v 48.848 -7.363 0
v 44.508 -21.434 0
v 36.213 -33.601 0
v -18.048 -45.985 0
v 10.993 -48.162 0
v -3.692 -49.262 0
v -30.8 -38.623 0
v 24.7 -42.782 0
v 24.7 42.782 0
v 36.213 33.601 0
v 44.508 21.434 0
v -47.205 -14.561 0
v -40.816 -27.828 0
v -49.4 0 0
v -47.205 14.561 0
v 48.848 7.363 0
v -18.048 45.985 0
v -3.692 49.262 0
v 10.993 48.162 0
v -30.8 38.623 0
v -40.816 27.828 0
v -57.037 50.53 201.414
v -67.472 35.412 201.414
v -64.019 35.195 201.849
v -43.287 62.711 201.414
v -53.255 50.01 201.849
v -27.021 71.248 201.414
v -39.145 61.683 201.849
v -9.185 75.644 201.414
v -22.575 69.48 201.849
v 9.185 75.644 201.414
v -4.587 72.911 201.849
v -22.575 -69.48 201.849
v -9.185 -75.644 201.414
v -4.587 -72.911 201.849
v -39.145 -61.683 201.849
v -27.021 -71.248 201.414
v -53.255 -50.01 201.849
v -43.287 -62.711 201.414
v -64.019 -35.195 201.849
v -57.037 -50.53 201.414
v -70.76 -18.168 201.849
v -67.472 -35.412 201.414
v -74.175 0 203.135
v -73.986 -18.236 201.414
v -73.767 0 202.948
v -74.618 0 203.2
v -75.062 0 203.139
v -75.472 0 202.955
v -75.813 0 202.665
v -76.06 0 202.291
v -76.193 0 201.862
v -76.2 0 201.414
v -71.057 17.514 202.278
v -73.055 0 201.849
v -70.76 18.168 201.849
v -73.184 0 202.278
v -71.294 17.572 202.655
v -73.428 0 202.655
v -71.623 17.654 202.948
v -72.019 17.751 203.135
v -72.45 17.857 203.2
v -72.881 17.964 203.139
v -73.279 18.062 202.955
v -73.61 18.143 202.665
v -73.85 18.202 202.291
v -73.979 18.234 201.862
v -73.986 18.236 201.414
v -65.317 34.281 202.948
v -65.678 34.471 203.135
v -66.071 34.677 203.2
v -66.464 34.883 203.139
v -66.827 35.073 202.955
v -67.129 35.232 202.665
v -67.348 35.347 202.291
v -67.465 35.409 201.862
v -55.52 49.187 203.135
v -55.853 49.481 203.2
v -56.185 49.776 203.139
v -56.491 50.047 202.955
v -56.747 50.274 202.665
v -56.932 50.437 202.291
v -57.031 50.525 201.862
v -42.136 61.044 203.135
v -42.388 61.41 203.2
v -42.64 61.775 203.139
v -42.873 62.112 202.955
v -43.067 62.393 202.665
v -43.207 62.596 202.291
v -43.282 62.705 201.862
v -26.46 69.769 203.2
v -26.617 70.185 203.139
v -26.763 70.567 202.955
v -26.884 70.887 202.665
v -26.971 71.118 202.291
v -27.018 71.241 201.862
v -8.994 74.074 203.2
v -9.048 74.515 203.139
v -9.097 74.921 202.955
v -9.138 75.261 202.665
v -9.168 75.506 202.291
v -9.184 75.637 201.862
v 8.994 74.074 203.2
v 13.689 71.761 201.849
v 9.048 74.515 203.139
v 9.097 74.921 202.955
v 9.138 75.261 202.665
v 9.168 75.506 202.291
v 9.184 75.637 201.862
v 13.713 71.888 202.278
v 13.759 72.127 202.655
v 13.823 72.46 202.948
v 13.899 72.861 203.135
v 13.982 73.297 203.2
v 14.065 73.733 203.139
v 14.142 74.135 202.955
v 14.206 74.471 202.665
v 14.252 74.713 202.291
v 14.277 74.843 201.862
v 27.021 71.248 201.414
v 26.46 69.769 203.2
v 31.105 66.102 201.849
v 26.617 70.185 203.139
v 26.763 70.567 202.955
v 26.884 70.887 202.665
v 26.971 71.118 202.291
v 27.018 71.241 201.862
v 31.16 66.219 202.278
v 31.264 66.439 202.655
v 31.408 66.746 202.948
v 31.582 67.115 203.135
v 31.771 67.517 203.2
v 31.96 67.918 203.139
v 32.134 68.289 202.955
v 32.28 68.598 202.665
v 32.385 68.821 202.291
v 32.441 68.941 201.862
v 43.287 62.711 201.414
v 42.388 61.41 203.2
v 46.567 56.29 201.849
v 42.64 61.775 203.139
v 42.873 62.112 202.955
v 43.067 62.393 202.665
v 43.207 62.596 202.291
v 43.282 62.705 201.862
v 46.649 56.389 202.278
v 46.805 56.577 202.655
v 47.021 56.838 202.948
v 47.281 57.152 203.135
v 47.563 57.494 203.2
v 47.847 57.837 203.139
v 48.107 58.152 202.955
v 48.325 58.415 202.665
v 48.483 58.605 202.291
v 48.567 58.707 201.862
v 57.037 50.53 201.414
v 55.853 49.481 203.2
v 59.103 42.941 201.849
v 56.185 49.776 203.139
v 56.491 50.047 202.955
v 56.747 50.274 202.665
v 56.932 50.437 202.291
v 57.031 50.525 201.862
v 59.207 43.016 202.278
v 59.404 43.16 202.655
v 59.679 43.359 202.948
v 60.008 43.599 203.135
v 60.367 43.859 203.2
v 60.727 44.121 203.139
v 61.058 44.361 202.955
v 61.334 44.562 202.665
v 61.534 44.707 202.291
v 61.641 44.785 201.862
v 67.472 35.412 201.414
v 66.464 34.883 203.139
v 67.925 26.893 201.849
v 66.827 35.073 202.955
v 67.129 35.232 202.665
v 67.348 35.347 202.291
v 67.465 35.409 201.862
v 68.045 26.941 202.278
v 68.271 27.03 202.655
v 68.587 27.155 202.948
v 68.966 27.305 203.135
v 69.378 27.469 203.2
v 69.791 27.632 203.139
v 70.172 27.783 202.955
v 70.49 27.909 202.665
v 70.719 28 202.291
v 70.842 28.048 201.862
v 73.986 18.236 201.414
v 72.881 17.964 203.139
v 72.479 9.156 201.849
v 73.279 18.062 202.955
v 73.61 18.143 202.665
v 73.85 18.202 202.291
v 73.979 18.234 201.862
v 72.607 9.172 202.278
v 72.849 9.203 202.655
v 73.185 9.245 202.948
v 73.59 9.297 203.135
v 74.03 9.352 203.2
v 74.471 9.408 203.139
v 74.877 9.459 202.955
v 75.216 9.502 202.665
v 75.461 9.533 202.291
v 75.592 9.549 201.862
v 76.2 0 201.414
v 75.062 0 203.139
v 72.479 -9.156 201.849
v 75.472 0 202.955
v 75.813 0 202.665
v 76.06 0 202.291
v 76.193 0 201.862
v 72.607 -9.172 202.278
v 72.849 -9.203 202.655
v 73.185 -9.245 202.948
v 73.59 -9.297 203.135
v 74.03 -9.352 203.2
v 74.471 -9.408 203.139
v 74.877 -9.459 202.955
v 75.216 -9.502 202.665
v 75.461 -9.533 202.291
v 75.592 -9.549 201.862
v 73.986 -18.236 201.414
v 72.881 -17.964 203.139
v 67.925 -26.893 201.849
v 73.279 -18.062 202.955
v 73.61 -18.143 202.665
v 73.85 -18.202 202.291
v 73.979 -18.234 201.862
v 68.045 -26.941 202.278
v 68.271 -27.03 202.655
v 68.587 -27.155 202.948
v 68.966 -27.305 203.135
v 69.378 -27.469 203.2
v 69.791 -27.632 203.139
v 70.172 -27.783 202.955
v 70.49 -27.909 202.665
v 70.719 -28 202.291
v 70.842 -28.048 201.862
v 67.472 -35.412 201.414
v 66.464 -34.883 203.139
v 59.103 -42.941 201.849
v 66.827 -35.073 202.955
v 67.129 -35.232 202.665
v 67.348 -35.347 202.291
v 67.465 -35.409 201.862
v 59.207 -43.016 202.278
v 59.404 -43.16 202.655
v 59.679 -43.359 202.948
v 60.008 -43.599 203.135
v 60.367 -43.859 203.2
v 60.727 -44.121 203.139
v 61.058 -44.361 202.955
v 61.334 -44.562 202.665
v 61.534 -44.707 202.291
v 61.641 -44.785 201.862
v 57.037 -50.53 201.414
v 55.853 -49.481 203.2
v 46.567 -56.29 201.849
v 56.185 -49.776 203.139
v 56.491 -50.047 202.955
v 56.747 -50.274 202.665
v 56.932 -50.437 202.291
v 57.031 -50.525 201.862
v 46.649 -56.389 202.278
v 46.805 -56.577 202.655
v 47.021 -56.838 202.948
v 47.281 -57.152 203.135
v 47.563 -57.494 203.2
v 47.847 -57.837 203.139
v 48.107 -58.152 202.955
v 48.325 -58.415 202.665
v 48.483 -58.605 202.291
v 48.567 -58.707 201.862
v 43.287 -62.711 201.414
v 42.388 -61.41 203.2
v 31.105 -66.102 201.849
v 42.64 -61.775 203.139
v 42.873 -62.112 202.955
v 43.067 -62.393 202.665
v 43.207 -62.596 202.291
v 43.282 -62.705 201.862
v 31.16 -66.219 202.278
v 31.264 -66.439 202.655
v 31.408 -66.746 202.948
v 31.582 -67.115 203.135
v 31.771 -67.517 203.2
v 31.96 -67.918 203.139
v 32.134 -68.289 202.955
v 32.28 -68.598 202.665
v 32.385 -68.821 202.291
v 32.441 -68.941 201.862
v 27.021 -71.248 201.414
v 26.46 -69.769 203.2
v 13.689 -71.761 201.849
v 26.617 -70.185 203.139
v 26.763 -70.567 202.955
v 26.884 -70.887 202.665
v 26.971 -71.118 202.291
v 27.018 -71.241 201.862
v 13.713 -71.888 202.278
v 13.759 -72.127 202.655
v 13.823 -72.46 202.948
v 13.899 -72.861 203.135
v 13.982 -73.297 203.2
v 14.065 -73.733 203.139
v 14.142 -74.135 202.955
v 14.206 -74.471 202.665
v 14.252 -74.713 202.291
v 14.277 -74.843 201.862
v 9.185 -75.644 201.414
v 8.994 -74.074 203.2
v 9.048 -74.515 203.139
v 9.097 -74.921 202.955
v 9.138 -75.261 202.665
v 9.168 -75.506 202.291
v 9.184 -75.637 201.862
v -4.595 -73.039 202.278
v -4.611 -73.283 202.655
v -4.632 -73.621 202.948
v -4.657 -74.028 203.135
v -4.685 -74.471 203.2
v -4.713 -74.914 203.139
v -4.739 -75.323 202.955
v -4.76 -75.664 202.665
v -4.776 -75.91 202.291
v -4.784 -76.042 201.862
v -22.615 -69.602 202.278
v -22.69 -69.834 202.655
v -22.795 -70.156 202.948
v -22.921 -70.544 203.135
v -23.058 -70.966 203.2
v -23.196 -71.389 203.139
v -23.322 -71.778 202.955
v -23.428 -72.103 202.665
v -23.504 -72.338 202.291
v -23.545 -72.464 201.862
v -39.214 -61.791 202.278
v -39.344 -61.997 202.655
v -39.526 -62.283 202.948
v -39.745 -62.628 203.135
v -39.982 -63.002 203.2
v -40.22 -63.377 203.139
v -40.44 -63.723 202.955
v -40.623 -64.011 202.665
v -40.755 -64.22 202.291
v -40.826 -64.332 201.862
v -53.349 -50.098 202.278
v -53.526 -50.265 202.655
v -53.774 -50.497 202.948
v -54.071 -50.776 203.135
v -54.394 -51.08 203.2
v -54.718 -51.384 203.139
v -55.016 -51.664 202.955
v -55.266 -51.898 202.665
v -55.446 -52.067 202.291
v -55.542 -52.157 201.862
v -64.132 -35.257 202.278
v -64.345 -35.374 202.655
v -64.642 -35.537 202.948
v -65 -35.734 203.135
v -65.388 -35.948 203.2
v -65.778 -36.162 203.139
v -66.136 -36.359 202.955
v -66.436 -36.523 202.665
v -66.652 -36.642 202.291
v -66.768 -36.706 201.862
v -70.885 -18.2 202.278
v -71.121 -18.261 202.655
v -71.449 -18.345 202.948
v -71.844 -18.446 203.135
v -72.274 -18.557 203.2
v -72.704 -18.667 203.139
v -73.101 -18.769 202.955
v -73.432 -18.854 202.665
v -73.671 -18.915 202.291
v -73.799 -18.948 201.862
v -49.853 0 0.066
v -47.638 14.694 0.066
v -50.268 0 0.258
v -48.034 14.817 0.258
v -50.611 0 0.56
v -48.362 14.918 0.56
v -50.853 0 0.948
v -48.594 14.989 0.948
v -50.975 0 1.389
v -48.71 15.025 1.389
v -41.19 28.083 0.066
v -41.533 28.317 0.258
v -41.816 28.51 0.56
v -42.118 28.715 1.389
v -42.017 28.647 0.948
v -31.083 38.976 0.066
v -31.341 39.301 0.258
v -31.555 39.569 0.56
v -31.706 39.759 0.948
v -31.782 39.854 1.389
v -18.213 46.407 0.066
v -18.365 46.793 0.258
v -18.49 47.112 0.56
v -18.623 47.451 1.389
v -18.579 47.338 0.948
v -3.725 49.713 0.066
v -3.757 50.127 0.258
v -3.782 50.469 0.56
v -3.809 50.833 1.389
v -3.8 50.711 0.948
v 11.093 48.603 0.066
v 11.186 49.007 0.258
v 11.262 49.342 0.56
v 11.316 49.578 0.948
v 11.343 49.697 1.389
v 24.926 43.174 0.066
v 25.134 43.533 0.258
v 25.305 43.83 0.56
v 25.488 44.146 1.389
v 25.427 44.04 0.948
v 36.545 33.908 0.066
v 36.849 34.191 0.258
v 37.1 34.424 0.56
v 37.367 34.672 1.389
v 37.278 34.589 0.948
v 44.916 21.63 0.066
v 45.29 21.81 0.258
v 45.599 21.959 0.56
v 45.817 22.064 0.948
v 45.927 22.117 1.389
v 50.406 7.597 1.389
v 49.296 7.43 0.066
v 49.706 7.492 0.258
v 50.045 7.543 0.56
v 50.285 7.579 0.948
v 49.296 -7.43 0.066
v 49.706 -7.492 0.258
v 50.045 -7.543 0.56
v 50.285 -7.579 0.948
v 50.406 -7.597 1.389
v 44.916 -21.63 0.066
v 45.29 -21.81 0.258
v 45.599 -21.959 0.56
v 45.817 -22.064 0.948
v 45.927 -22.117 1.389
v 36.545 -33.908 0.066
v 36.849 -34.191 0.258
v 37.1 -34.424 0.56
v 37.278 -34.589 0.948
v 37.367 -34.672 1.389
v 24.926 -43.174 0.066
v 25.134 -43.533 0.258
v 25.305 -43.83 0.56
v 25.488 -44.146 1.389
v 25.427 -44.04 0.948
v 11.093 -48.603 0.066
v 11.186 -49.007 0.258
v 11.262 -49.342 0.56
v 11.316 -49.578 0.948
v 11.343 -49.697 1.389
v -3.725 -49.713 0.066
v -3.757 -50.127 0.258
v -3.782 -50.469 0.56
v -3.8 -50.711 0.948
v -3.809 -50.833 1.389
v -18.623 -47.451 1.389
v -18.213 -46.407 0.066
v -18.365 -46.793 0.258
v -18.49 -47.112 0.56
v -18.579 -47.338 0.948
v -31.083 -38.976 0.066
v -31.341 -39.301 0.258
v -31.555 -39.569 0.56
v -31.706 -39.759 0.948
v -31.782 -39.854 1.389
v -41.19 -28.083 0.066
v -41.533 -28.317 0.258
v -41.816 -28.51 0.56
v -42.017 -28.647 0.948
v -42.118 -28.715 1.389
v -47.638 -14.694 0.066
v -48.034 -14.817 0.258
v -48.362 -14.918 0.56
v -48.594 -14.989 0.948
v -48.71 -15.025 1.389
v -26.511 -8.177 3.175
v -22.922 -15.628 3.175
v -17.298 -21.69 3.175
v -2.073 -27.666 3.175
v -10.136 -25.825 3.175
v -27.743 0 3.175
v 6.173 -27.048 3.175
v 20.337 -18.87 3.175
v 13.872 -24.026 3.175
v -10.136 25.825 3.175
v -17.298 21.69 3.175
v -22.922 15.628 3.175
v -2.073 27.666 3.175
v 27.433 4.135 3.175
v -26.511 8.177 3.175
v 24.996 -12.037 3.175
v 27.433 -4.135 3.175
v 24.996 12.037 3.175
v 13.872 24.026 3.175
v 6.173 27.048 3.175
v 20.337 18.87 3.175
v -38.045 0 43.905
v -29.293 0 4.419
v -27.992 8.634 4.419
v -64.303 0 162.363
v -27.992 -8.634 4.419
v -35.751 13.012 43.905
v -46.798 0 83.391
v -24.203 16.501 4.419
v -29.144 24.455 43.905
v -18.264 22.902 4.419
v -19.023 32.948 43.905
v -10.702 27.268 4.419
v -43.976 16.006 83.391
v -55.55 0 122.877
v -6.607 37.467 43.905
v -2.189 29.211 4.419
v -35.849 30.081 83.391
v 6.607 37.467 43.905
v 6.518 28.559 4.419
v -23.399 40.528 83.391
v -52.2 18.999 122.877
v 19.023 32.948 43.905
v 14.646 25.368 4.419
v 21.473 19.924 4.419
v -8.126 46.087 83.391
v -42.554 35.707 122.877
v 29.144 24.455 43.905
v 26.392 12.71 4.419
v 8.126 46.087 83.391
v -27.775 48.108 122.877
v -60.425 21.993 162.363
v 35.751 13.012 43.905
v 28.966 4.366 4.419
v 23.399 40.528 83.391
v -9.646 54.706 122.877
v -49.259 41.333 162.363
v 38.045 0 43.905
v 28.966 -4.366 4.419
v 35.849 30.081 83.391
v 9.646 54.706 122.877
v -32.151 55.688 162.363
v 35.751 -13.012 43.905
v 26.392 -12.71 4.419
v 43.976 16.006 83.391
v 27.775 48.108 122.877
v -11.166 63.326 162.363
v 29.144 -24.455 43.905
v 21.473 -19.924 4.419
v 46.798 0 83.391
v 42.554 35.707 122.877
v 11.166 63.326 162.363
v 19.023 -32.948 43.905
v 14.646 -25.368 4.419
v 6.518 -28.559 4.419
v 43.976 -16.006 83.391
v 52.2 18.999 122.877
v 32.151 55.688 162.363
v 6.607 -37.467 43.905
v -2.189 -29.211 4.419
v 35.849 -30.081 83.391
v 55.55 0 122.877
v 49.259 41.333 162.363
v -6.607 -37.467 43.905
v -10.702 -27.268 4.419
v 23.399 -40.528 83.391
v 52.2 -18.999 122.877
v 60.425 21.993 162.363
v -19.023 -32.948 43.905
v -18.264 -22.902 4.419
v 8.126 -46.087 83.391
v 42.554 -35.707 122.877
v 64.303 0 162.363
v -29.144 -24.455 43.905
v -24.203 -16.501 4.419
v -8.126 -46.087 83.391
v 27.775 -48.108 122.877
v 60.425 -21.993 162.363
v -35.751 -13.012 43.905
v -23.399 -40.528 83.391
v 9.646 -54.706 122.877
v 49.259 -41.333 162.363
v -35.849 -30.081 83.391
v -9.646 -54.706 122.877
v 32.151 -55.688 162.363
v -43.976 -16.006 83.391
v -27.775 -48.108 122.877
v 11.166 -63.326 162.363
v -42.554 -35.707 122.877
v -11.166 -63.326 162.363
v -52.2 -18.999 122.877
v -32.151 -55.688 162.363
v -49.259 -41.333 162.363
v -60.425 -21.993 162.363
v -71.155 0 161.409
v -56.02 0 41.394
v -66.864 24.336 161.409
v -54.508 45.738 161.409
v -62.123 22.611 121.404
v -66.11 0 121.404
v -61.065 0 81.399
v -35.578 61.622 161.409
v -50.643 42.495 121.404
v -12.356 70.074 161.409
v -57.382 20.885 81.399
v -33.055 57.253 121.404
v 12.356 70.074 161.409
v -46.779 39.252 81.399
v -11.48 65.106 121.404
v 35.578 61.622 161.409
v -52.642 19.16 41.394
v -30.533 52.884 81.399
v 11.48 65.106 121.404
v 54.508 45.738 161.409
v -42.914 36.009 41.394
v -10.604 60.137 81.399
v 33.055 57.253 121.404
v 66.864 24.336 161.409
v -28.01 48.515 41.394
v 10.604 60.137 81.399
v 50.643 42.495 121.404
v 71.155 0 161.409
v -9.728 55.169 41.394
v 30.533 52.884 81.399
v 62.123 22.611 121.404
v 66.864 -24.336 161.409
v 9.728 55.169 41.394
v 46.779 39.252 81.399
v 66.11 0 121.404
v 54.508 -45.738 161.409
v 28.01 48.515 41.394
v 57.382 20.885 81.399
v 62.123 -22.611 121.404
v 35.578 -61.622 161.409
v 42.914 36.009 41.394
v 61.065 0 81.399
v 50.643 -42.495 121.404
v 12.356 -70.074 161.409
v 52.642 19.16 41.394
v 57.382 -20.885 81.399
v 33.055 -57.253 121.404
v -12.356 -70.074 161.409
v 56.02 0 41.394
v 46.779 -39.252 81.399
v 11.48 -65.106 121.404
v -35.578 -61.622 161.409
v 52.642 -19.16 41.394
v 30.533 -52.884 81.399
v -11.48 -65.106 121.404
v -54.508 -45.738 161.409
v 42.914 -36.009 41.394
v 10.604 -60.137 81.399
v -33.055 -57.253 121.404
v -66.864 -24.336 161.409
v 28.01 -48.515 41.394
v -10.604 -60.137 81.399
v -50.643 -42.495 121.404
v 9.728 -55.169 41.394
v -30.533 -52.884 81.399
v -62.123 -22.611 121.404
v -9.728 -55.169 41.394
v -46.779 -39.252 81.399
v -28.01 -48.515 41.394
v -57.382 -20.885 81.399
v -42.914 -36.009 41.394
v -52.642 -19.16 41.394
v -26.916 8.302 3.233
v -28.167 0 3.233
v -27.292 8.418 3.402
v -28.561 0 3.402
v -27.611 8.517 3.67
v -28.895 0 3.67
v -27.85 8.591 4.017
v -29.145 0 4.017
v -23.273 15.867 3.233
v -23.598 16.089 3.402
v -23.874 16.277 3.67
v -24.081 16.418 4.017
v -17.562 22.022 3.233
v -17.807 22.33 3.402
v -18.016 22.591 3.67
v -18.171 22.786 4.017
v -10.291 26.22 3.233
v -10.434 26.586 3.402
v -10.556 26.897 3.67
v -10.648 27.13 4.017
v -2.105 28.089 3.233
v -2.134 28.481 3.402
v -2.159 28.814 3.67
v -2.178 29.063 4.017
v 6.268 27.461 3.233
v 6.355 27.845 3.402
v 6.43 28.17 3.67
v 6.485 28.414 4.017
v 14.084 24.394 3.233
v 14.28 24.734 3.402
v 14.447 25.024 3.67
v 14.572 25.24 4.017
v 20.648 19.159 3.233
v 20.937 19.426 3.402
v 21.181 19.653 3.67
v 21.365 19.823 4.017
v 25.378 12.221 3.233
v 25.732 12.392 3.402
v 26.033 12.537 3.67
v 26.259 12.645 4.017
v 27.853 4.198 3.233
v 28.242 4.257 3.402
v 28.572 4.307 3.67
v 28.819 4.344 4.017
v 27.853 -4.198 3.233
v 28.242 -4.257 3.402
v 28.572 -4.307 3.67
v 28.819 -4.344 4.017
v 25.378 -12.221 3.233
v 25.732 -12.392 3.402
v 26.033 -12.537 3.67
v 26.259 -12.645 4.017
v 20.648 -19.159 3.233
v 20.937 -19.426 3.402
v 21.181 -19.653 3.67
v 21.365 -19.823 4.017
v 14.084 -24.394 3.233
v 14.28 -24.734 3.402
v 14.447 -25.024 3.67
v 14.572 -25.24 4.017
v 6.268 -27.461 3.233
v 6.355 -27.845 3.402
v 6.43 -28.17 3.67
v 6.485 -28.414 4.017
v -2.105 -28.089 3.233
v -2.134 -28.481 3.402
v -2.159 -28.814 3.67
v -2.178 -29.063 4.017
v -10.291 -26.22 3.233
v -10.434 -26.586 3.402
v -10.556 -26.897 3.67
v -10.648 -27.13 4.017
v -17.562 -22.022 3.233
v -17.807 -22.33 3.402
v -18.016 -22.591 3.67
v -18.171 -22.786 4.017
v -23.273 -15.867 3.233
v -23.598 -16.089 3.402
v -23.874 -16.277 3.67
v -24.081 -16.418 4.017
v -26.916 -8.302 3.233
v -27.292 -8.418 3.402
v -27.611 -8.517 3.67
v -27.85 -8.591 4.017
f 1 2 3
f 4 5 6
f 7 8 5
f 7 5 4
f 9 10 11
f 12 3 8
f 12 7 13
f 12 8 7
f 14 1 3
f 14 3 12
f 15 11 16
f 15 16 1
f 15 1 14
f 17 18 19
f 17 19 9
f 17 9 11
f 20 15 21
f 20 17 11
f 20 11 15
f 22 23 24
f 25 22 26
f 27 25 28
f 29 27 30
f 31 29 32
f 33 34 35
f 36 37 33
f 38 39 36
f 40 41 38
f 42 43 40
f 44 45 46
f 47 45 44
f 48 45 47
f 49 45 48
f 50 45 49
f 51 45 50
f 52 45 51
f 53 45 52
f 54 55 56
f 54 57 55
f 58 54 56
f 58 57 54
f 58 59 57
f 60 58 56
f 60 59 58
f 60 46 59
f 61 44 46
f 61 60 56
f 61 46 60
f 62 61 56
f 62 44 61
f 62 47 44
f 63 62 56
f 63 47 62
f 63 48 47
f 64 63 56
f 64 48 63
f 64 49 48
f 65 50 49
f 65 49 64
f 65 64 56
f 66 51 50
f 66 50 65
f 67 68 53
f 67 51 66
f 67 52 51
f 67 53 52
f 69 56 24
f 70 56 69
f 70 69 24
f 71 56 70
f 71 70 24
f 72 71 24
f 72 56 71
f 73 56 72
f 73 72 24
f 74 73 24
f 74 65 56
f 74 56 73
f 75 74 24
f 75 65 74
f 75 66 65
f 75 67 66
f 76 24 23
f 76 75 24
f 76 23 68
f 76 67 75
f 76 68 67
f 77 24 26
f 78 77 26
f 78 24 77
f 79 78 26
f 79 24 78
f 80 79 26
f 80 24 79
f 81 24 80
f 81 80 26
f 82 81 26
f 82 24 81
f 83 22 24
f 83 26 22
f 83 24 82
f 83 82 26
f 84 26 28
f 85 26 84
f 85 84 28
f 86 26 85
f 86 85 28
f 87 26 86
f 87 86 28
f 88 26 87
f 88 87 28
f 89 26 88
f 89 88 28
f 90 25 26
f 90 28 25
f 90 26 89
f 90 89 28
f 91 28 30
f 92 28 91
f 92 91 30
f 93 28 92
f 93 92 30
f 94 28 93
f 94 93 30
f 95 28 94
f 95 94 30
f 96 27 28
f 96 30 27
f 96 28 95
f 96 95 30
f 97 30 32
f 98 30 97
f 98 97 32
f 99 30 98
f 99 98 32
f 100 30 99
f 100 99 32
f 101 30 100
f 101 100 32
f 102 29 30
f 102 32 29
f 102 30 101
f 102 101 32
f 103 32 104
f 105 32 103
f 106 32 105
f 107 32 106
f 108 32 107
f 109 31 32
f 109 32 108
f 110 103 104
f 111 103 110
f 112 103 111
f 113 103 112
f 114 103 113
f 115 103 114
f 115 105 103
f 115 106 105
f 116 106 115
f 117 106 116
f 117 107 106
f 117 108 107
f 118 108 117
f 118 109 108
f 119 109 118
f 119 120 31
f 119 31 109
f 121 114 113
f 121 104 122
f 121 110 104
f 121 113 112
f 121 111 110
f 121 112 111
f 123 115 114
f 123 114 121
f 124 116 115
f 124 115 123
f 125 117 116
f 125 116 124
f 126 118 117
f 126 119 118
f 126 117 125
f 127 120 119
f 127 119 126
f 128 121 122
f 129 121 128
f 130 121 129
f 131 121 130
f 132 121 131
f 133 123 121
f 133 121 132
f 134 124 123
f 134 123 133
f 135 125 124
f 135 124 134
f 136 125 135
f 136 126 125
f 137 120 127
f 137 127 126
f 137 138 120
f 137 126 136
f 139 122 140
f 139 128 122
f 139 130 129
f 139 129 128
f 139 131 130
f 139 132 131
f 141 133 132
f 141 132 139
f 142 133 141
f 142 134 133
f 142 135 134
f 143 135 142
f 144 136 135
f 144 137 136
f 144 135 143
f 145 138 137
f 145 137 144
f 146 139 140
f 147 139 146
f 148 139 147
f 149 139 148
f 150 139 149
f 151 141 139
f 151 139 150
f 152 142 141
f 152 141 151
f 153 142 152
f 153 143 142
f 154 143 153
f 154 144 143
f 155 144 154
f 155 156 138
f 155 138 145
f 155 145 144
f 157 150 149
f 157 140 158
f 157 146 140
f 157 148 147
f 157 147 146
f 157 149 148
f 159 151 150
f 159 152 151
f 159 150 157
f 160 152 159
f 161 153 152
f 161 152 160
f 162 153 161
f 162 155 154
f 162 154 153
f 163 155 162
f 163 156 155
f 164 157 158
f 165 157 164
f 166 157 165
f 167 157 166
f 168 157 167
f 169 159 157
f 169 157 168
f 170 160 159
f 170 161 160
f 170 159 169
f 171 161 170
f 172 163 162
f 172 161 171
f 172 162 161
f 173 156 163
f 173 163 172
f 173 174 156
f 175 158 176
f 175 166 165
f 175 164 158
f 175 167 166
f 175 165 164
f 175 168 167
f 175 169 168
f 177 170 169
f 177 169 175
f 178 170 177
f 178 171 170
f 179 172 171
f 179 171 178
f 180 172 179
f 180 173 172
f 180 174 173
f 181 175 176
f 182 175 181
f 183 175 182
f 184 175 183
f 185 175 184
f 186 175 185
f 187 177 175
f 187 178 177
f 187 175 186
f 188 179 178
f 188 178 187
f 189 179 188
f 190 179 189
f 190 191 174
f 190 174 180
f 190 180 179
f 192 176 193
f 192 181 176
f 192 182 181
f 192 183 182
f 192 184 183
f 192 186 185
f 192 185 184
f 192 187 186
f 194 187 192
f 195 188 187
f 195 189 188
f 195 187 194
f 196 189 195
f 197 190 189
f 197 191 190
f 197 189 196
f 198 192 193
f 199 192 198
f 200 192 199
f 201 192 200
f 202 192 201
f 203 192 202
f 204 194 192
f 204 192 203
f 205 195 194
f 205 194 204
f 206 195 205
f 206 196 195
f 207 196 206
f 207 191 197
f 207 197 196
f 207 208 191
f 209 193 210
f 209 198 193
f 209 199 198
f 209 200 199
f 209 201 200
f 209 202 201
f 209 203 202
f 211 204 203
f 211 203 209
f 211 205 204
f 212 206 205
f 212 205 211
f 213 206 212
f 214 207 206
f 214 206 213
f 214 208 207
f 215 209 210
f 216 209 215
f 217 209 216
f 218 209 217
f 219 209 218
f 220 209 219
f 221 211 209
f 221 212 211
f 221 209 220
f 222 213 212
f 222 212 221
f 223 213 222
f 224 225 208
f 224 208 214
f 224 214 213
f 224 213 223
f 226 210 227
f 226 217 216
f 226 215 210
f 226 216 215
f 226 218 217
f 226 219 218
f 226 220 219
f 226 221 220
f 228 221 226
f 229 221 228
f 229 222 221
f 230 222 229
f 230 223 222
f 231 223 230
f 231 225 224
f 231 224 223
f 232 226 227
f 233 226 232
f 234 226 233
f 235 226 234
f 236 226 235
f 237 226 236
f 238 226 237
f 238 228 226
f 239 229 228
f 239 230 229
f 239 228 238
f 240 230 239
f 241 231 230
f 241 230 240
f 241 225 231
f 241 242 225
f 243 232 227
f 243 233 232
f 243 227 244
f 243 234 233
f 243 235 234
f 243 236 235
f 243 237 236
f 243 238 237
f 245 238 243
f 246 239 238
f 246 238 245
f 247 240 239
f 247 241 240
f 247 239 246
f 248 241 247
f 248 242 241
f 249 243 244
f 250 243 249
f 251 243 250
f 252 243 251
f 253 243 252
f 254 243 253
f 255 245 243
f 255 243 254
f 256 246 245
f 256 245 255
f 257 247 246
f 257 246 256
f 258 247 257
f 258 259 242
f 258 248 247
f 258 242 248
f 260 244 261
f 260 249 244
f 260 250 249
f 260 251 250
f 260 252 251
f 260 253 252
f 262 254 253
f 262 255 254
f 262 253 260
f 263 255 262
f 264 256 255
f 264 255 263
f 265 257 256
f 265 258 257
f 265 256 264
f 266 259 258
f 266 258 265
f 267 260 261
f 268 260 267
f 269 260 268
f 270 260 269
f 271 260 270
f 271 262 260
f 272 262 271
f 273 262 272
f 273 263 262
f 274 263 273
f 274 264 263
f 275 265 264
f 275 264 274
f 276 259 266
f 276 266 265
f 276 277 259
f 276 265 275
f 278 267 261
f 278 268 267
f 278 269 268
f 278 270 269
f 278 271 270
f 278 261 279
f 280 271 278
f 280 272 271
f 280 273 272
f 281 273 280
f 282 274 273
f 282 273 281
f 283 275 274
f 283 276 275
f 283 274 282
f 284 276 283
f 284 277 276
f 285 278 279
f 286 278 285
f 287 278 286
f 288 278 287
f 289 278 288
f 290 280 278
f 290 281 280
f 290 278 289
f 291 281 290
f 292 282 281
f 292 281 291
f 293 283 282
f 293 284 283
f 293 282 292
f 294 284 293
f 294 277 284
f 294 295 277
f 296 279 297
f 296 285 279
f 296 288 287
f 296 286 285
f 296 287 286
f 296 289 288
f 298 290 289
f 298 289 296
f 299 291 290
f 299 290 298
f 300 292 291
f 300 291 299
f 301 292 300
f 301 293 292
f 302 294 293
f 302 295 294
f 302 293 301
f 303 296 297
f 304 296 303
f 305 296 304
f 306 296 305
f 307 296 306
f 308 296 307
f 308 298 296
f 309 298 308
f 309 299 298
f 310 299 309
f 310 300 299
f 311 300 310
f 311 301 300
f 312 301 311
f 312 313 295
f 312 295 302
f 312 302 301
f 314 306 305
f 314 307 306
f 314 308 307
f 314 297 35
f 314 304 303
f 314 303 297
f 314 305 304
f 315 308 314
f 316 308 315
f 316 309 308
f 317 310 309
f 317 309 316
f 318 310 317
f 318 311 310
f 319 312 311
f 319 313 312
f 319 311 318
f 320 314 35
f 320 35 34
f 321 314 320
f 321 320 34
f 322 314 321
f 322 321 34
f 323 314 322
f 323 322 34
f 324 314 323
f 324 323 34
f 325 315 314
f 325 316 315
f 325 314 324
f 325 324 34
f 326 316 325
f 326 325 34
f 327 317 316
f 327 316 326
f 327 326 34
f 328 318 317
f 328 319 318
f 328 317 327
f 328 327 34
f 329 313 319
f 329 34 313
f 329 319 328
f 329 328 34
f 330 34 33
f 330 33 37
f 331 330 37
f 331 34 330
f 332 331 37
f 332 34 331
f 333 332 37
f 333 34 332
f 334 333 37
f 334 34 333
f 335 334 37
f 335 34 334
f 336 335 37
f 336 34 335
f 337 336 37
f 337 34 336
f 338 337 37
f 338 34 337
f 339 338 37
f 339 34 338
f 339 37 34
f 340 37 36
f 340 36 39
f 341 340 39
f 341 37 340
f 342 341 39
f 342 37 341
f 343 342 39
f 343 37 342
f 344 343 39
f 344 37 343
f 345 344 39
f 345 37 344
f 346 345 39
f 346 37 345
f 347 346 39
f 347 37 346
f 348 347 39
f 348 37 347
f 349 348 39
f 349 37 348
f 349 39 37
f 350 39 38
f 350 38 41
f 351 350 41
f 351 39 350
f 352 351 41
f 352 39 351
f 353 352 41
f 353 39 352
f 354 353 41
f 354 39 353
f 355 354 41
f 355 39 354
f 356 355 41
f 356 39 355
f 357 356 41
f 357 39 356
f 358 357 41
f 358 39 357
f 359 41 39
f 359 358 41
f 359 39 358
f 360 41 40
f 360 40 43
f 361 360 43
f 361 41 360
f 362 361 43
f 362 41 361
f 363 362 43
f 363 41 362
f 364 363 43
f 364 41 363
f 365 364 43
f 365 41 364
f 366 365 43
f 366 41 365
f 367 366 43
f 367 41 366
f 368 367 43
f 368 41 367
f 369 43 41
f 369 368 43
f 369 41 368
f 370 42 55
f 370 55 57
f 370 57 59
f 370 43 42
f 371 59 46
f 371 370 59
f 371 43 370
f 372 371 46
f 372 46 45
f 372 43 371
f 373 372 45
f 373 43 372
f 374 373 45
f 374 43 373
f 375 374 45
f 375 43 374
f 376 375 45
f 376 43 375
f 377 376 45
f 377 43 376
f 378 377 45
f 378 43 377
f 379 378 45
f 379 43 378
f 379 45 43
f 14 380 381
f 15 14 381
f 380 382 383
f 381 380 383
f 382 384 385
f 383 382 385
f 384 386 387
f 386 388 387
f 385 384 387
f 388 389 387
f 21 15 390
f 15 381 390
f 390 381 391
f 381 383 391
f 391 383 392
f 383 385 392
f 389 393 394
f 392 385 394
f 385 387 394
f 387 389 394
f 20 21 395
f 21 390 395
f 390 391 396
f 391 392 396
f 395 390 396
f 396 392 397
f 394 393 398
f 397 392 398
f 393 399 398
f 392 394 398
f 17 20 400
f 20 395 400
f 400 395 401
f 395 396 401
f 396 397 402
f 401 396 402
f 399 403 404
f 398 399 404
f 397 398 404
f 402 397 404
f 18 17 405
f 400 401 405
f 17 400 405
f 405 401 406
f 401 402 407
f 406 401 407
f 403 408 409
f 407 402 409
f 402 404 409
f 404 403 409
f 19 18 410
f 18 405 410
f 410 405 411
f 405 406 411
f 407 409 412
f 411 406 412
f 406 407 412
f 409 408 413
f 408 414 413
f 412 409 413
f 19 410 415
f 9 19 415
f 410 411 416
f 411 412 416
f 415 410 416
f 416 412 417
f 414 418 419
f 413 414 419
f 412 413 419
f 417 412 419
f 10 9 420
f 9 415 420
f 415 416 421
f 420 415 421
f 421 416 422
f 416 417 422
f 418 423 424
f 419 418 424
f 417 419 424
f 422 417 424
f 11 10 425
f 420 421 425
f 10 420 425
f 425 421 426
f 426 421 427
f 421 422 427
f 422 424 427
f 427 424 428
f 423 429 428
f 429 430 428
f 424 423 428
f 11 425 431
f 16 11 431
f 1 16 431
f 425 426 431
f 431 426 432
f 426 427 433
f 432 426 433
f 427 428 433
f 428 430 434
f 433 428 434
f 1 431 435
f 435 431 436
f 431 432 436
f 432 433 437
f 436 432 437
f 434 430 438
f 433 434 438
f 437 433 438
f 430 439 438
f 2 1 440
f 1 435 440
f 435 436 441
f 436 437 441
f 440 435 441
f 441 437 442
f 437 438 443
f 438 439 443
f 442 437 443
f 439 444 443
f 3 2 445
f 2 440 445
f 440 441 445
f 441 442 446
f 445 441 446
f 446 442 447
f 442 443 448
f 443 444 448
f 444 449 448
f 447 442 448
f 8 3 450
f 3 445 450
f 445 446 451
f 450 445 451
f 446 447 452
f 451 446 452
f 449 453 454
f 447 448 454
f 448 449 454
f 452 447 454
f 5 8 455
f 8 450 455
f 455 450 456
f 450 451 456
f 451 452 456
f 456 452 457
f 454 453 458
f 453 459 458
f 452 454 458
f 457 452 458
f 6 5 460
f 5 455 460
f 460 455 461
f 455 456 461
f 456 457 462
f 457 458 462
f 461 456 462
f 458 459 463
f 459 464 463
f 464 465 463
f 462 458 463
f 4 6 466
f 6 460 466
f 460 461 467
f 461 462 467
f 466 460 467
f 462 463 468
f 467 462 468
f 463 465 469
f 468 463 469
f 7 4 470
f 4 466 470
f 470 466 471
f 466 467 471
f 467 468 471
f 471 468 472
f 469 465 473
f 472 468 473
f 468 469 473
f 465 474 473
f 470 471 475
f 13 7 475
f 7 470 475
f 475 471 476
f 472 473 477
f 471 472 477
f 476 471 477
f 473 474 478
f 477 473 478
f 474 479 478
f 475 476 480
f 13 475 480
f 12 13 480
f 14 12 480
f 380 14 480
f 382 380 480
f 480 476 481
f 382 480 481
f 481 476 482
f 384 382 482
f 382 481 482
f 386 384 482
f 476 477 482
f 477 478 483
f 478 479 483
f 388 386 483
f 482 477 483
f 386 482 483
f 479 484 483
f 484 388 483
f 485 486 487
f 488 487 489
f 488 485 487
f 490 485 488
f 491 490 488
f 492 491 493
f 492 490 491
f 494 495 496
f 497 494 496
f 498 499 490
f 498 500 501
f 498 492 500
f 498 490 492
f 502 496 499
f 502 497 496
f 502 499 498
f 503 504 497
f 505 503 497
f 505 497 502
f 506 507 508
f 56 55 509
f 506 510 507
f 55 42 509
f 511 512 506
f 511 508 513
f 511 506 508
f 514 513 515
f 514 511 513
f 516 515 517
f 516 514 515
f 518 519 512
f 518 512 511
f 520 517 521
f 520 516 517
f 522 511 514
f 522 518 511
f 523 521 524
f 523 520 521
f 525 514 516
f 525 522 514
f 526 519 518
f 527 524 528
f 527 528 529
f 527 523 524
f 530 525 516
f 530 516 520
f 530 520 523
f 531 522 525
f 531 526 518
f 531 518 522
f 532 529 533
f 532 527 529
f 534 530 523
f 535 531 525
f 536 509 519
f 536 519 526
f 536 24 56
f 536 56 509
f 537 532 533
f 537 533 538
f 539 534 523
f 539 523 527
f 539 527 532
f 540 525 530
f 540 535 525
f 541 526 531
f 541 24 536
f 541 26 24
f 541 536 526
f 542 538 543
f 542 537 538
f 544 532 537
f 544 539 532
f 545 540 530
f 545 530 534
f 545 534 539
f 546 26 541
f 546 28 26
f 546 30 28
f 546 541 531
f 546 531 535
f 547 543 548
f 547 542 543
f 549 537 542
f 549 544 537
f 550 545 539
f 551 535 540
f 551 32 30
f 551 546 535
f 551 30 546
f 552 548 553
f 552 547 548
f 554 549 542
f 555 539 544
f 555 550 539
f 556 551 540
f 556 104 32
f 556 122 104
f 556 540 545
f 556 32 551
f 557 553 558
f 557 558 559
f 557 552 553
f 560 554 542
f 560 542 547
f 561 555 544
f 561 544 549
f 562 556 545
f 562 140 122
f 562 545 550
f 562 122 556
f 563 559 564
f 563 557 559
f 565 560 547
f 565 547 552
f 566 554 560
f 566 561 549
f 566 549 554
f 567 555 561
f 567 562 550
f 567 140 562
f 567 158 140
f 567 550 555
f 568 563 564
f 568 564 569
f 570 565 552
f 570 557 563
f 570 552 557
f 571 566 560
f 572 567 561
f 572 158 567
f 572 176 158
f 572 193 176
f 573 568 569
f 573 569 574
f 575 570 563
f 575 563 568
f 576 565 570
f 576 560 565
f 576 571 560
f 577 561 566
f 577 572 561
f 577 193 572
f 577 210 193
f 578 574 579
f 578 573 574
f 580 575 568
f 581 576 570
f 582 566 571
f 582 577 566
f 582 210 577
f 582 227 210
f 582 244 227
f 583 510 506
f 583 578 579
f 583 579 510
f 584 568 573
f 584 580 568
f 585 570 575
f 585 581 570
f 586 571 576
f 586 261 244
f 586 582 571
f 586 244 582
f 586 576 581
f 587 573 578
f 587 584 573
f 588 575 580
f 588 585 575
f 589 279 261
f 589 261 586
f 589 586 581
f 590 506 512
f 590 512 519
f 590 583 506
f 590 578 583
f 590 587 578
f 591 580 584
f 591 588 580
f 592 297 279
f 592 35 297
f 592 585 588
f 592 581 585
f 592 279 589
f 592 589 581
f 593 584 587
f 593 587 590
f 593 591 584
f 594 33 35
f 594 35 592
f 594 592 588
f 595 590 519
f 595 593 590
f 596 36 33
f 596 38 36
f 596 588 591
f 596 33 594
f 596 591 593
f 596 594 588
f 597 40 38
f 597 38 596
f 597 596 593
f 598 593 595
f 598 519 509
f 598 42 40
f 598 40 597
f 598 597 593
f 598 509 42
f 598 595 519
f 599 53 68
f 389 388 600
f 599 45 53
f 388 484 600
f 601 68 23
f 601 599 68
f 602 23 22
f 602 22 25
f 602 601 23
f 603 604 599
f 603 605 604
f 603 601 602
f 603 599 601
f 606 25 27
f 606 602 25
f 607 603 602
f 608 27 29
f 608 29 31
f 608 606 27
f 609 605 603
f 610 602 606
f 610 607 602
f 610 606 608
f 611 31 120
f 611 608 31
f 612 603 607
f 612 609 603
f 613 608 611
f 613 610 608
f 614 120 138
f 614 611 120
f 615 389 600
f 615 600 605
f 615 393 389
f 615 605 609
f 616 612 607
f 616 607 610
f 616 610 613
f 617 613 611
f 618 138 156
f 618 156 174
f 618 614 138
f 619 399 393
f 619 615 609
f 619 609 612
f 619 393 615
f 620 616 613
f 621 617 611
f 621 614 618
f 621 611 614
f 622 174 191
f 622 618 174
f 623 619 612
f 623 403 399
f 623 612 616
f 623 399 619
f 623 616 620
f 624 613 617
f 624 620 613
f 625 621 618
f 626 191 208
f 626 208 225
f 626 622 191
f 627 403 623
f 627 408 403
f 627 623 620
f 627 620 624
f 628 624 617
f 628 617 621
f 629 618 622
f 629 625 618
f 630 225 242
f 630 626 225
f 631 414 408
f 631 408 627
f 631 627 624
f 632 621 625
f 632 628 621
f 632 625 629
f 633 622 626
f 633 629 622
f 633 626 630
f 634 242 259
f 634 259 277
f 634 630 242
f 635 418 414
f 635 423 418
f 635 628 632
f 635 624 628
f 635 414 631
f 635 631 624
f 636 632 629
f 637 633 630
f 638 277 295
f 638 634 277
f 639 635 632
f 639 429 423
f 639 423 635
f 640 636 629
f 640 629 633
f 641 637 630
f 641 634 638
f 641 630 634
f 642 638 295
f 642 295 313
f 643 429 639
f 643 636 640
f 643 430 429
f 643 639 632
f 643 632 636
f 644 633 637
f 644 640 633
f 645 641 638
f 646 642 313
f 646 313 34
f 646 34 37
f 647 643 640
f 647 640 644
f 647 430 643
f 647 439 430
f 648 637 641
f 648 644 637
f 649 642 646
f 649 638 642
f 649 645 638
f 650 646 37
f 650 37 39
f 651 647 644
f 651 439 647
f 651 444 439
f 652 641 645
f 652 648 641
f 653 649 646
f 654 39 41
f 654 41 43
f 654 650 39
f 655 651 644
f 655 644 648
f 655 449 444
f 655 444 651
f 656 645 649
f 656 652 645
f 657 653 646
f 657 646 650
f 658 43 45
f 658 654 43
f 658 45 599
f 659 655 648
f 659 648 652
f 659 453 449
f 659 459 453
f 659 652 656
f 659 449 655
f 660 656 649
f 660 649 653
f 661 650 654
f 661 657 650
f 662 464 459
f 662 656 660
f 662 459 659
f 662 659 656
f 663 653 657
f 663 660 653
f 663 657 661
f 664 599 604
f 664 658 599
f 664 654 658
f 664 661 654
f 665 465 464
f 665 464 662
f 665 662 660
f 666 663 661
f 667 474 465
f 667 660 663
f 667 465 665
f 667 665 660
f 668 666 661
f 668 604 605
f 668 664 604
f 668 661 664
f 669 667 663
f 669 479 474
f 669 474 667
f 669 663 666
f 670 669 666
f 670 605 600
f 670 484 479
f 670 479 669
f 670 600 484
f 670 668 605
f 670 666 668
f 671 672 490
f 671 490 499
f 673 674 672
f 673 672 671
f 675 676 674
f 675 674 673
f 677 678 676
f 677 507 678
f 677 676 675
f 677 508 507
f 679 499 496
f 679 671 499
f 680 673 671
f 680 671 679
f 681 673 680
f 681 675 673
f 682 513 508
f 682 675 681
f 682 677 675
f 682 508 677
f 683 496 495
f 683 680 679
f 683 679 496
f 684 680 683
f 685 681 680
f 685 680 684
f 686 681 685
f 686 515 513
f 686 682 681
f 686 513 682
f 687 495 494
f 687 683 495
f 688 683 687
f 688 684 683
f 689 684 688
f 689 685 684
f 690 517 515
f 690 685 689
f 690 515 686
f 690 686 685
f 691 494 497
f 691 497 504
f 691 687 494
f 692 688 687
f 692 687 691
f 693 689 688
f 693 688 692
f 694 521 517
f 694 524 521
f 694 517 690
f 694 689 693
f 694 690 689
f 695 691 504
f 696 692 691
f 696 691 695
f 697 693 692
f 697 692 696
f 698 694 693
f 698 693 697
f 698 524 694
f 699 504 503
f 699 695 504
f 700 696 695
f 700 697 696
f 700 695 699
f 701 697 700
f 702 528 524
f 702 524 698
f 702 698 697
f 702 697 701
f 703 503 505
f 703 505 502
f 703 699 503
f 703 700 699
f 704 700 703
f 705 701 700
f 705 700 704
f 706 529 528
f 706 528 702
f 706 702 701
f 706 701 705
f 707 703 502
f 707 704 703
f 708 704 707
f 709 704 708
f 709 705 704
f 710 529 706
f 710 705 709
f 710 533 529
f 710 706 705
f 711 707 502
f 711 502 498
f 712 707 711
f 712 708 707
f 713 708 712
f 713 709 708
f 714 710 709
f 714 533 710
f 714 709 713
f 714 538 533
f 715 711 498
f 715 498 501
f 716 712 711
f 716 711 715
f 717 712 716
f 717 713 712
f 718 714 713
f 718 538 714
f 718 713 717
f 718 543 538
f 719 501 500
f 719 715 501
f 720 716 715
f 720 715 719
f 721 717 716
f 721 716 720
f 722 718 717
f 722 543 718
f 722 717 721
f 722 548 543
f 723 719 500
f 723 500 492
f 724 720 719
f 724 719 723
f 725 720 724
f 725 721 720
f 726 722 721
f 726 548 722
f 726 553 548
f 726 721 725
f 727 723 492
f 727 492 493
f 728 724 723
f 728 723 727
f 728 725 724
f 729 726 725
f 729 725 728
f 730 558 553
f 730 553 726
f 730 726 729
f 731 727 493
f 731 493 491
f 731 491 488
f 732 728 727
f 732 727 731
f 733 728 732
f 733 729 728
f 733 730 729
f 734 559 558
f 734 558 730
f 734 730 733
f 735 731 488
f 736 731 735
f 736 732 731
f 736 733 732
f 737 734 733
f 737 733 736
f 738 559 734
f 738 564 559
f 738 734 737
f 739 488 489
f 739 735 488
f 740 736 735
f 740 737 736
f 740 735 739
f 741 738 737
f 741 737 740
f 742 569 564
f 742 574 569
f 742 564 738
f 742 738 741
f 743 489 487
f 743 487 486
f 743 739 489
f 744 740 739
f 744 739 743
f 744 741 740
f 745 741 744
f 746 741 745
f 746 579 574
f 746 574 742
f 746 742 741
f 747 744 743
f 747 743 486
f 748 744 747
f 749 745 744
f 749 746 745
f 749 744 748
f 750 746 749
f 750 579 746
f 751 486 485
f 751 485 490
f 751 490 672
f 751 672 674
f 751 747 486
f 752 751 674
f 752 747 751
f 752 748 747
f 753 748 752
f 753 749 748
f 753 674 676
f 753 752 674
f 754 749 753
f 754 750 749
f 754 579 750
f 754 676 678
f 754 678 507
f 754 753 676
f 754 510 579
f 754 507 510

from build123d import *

# Parameters (mm, degrees)
F3_R = 1.5875


# Not quite as in the source:
# - a variable given as a bare number and used for a length is read in inches; the dataset says mm whatever the document's units were


with BuildPart() as f2:
    # F1 (on Front) → F2 (revolve)
    with BuildSketch(Plane.XZ):
        with BuildLine():
            Line((-50.8, 0), (0, 0))
            Line((0, 0), (0, 3.175))
            Line((0, 3.175), (-29.0172447749, 3.175))
            Line((-29.0172447749, 3.175), (-73.0551675175, 201.8488507874))
            ThreePointArc((-73.0551675175, 201.8488507874), (-74.8424777646, 203.1850293835), (-76.2, 201.4138759344))
            Line((-76.2, 201.4138759344), (-50.8, 0))
        make_face()
    revolve(axis=Axis((0, 0, 1.5875), (0, 0, -1)))

    # F3
    f3_edges = [f2.edges().sort_by_distance(p)[0] for p in [
        (50.8, 0, 0),
        (29.017245, 0, 3.175),
    ]]
    fillet(f3_edges, radius=F3_R)


solid = f2.part
